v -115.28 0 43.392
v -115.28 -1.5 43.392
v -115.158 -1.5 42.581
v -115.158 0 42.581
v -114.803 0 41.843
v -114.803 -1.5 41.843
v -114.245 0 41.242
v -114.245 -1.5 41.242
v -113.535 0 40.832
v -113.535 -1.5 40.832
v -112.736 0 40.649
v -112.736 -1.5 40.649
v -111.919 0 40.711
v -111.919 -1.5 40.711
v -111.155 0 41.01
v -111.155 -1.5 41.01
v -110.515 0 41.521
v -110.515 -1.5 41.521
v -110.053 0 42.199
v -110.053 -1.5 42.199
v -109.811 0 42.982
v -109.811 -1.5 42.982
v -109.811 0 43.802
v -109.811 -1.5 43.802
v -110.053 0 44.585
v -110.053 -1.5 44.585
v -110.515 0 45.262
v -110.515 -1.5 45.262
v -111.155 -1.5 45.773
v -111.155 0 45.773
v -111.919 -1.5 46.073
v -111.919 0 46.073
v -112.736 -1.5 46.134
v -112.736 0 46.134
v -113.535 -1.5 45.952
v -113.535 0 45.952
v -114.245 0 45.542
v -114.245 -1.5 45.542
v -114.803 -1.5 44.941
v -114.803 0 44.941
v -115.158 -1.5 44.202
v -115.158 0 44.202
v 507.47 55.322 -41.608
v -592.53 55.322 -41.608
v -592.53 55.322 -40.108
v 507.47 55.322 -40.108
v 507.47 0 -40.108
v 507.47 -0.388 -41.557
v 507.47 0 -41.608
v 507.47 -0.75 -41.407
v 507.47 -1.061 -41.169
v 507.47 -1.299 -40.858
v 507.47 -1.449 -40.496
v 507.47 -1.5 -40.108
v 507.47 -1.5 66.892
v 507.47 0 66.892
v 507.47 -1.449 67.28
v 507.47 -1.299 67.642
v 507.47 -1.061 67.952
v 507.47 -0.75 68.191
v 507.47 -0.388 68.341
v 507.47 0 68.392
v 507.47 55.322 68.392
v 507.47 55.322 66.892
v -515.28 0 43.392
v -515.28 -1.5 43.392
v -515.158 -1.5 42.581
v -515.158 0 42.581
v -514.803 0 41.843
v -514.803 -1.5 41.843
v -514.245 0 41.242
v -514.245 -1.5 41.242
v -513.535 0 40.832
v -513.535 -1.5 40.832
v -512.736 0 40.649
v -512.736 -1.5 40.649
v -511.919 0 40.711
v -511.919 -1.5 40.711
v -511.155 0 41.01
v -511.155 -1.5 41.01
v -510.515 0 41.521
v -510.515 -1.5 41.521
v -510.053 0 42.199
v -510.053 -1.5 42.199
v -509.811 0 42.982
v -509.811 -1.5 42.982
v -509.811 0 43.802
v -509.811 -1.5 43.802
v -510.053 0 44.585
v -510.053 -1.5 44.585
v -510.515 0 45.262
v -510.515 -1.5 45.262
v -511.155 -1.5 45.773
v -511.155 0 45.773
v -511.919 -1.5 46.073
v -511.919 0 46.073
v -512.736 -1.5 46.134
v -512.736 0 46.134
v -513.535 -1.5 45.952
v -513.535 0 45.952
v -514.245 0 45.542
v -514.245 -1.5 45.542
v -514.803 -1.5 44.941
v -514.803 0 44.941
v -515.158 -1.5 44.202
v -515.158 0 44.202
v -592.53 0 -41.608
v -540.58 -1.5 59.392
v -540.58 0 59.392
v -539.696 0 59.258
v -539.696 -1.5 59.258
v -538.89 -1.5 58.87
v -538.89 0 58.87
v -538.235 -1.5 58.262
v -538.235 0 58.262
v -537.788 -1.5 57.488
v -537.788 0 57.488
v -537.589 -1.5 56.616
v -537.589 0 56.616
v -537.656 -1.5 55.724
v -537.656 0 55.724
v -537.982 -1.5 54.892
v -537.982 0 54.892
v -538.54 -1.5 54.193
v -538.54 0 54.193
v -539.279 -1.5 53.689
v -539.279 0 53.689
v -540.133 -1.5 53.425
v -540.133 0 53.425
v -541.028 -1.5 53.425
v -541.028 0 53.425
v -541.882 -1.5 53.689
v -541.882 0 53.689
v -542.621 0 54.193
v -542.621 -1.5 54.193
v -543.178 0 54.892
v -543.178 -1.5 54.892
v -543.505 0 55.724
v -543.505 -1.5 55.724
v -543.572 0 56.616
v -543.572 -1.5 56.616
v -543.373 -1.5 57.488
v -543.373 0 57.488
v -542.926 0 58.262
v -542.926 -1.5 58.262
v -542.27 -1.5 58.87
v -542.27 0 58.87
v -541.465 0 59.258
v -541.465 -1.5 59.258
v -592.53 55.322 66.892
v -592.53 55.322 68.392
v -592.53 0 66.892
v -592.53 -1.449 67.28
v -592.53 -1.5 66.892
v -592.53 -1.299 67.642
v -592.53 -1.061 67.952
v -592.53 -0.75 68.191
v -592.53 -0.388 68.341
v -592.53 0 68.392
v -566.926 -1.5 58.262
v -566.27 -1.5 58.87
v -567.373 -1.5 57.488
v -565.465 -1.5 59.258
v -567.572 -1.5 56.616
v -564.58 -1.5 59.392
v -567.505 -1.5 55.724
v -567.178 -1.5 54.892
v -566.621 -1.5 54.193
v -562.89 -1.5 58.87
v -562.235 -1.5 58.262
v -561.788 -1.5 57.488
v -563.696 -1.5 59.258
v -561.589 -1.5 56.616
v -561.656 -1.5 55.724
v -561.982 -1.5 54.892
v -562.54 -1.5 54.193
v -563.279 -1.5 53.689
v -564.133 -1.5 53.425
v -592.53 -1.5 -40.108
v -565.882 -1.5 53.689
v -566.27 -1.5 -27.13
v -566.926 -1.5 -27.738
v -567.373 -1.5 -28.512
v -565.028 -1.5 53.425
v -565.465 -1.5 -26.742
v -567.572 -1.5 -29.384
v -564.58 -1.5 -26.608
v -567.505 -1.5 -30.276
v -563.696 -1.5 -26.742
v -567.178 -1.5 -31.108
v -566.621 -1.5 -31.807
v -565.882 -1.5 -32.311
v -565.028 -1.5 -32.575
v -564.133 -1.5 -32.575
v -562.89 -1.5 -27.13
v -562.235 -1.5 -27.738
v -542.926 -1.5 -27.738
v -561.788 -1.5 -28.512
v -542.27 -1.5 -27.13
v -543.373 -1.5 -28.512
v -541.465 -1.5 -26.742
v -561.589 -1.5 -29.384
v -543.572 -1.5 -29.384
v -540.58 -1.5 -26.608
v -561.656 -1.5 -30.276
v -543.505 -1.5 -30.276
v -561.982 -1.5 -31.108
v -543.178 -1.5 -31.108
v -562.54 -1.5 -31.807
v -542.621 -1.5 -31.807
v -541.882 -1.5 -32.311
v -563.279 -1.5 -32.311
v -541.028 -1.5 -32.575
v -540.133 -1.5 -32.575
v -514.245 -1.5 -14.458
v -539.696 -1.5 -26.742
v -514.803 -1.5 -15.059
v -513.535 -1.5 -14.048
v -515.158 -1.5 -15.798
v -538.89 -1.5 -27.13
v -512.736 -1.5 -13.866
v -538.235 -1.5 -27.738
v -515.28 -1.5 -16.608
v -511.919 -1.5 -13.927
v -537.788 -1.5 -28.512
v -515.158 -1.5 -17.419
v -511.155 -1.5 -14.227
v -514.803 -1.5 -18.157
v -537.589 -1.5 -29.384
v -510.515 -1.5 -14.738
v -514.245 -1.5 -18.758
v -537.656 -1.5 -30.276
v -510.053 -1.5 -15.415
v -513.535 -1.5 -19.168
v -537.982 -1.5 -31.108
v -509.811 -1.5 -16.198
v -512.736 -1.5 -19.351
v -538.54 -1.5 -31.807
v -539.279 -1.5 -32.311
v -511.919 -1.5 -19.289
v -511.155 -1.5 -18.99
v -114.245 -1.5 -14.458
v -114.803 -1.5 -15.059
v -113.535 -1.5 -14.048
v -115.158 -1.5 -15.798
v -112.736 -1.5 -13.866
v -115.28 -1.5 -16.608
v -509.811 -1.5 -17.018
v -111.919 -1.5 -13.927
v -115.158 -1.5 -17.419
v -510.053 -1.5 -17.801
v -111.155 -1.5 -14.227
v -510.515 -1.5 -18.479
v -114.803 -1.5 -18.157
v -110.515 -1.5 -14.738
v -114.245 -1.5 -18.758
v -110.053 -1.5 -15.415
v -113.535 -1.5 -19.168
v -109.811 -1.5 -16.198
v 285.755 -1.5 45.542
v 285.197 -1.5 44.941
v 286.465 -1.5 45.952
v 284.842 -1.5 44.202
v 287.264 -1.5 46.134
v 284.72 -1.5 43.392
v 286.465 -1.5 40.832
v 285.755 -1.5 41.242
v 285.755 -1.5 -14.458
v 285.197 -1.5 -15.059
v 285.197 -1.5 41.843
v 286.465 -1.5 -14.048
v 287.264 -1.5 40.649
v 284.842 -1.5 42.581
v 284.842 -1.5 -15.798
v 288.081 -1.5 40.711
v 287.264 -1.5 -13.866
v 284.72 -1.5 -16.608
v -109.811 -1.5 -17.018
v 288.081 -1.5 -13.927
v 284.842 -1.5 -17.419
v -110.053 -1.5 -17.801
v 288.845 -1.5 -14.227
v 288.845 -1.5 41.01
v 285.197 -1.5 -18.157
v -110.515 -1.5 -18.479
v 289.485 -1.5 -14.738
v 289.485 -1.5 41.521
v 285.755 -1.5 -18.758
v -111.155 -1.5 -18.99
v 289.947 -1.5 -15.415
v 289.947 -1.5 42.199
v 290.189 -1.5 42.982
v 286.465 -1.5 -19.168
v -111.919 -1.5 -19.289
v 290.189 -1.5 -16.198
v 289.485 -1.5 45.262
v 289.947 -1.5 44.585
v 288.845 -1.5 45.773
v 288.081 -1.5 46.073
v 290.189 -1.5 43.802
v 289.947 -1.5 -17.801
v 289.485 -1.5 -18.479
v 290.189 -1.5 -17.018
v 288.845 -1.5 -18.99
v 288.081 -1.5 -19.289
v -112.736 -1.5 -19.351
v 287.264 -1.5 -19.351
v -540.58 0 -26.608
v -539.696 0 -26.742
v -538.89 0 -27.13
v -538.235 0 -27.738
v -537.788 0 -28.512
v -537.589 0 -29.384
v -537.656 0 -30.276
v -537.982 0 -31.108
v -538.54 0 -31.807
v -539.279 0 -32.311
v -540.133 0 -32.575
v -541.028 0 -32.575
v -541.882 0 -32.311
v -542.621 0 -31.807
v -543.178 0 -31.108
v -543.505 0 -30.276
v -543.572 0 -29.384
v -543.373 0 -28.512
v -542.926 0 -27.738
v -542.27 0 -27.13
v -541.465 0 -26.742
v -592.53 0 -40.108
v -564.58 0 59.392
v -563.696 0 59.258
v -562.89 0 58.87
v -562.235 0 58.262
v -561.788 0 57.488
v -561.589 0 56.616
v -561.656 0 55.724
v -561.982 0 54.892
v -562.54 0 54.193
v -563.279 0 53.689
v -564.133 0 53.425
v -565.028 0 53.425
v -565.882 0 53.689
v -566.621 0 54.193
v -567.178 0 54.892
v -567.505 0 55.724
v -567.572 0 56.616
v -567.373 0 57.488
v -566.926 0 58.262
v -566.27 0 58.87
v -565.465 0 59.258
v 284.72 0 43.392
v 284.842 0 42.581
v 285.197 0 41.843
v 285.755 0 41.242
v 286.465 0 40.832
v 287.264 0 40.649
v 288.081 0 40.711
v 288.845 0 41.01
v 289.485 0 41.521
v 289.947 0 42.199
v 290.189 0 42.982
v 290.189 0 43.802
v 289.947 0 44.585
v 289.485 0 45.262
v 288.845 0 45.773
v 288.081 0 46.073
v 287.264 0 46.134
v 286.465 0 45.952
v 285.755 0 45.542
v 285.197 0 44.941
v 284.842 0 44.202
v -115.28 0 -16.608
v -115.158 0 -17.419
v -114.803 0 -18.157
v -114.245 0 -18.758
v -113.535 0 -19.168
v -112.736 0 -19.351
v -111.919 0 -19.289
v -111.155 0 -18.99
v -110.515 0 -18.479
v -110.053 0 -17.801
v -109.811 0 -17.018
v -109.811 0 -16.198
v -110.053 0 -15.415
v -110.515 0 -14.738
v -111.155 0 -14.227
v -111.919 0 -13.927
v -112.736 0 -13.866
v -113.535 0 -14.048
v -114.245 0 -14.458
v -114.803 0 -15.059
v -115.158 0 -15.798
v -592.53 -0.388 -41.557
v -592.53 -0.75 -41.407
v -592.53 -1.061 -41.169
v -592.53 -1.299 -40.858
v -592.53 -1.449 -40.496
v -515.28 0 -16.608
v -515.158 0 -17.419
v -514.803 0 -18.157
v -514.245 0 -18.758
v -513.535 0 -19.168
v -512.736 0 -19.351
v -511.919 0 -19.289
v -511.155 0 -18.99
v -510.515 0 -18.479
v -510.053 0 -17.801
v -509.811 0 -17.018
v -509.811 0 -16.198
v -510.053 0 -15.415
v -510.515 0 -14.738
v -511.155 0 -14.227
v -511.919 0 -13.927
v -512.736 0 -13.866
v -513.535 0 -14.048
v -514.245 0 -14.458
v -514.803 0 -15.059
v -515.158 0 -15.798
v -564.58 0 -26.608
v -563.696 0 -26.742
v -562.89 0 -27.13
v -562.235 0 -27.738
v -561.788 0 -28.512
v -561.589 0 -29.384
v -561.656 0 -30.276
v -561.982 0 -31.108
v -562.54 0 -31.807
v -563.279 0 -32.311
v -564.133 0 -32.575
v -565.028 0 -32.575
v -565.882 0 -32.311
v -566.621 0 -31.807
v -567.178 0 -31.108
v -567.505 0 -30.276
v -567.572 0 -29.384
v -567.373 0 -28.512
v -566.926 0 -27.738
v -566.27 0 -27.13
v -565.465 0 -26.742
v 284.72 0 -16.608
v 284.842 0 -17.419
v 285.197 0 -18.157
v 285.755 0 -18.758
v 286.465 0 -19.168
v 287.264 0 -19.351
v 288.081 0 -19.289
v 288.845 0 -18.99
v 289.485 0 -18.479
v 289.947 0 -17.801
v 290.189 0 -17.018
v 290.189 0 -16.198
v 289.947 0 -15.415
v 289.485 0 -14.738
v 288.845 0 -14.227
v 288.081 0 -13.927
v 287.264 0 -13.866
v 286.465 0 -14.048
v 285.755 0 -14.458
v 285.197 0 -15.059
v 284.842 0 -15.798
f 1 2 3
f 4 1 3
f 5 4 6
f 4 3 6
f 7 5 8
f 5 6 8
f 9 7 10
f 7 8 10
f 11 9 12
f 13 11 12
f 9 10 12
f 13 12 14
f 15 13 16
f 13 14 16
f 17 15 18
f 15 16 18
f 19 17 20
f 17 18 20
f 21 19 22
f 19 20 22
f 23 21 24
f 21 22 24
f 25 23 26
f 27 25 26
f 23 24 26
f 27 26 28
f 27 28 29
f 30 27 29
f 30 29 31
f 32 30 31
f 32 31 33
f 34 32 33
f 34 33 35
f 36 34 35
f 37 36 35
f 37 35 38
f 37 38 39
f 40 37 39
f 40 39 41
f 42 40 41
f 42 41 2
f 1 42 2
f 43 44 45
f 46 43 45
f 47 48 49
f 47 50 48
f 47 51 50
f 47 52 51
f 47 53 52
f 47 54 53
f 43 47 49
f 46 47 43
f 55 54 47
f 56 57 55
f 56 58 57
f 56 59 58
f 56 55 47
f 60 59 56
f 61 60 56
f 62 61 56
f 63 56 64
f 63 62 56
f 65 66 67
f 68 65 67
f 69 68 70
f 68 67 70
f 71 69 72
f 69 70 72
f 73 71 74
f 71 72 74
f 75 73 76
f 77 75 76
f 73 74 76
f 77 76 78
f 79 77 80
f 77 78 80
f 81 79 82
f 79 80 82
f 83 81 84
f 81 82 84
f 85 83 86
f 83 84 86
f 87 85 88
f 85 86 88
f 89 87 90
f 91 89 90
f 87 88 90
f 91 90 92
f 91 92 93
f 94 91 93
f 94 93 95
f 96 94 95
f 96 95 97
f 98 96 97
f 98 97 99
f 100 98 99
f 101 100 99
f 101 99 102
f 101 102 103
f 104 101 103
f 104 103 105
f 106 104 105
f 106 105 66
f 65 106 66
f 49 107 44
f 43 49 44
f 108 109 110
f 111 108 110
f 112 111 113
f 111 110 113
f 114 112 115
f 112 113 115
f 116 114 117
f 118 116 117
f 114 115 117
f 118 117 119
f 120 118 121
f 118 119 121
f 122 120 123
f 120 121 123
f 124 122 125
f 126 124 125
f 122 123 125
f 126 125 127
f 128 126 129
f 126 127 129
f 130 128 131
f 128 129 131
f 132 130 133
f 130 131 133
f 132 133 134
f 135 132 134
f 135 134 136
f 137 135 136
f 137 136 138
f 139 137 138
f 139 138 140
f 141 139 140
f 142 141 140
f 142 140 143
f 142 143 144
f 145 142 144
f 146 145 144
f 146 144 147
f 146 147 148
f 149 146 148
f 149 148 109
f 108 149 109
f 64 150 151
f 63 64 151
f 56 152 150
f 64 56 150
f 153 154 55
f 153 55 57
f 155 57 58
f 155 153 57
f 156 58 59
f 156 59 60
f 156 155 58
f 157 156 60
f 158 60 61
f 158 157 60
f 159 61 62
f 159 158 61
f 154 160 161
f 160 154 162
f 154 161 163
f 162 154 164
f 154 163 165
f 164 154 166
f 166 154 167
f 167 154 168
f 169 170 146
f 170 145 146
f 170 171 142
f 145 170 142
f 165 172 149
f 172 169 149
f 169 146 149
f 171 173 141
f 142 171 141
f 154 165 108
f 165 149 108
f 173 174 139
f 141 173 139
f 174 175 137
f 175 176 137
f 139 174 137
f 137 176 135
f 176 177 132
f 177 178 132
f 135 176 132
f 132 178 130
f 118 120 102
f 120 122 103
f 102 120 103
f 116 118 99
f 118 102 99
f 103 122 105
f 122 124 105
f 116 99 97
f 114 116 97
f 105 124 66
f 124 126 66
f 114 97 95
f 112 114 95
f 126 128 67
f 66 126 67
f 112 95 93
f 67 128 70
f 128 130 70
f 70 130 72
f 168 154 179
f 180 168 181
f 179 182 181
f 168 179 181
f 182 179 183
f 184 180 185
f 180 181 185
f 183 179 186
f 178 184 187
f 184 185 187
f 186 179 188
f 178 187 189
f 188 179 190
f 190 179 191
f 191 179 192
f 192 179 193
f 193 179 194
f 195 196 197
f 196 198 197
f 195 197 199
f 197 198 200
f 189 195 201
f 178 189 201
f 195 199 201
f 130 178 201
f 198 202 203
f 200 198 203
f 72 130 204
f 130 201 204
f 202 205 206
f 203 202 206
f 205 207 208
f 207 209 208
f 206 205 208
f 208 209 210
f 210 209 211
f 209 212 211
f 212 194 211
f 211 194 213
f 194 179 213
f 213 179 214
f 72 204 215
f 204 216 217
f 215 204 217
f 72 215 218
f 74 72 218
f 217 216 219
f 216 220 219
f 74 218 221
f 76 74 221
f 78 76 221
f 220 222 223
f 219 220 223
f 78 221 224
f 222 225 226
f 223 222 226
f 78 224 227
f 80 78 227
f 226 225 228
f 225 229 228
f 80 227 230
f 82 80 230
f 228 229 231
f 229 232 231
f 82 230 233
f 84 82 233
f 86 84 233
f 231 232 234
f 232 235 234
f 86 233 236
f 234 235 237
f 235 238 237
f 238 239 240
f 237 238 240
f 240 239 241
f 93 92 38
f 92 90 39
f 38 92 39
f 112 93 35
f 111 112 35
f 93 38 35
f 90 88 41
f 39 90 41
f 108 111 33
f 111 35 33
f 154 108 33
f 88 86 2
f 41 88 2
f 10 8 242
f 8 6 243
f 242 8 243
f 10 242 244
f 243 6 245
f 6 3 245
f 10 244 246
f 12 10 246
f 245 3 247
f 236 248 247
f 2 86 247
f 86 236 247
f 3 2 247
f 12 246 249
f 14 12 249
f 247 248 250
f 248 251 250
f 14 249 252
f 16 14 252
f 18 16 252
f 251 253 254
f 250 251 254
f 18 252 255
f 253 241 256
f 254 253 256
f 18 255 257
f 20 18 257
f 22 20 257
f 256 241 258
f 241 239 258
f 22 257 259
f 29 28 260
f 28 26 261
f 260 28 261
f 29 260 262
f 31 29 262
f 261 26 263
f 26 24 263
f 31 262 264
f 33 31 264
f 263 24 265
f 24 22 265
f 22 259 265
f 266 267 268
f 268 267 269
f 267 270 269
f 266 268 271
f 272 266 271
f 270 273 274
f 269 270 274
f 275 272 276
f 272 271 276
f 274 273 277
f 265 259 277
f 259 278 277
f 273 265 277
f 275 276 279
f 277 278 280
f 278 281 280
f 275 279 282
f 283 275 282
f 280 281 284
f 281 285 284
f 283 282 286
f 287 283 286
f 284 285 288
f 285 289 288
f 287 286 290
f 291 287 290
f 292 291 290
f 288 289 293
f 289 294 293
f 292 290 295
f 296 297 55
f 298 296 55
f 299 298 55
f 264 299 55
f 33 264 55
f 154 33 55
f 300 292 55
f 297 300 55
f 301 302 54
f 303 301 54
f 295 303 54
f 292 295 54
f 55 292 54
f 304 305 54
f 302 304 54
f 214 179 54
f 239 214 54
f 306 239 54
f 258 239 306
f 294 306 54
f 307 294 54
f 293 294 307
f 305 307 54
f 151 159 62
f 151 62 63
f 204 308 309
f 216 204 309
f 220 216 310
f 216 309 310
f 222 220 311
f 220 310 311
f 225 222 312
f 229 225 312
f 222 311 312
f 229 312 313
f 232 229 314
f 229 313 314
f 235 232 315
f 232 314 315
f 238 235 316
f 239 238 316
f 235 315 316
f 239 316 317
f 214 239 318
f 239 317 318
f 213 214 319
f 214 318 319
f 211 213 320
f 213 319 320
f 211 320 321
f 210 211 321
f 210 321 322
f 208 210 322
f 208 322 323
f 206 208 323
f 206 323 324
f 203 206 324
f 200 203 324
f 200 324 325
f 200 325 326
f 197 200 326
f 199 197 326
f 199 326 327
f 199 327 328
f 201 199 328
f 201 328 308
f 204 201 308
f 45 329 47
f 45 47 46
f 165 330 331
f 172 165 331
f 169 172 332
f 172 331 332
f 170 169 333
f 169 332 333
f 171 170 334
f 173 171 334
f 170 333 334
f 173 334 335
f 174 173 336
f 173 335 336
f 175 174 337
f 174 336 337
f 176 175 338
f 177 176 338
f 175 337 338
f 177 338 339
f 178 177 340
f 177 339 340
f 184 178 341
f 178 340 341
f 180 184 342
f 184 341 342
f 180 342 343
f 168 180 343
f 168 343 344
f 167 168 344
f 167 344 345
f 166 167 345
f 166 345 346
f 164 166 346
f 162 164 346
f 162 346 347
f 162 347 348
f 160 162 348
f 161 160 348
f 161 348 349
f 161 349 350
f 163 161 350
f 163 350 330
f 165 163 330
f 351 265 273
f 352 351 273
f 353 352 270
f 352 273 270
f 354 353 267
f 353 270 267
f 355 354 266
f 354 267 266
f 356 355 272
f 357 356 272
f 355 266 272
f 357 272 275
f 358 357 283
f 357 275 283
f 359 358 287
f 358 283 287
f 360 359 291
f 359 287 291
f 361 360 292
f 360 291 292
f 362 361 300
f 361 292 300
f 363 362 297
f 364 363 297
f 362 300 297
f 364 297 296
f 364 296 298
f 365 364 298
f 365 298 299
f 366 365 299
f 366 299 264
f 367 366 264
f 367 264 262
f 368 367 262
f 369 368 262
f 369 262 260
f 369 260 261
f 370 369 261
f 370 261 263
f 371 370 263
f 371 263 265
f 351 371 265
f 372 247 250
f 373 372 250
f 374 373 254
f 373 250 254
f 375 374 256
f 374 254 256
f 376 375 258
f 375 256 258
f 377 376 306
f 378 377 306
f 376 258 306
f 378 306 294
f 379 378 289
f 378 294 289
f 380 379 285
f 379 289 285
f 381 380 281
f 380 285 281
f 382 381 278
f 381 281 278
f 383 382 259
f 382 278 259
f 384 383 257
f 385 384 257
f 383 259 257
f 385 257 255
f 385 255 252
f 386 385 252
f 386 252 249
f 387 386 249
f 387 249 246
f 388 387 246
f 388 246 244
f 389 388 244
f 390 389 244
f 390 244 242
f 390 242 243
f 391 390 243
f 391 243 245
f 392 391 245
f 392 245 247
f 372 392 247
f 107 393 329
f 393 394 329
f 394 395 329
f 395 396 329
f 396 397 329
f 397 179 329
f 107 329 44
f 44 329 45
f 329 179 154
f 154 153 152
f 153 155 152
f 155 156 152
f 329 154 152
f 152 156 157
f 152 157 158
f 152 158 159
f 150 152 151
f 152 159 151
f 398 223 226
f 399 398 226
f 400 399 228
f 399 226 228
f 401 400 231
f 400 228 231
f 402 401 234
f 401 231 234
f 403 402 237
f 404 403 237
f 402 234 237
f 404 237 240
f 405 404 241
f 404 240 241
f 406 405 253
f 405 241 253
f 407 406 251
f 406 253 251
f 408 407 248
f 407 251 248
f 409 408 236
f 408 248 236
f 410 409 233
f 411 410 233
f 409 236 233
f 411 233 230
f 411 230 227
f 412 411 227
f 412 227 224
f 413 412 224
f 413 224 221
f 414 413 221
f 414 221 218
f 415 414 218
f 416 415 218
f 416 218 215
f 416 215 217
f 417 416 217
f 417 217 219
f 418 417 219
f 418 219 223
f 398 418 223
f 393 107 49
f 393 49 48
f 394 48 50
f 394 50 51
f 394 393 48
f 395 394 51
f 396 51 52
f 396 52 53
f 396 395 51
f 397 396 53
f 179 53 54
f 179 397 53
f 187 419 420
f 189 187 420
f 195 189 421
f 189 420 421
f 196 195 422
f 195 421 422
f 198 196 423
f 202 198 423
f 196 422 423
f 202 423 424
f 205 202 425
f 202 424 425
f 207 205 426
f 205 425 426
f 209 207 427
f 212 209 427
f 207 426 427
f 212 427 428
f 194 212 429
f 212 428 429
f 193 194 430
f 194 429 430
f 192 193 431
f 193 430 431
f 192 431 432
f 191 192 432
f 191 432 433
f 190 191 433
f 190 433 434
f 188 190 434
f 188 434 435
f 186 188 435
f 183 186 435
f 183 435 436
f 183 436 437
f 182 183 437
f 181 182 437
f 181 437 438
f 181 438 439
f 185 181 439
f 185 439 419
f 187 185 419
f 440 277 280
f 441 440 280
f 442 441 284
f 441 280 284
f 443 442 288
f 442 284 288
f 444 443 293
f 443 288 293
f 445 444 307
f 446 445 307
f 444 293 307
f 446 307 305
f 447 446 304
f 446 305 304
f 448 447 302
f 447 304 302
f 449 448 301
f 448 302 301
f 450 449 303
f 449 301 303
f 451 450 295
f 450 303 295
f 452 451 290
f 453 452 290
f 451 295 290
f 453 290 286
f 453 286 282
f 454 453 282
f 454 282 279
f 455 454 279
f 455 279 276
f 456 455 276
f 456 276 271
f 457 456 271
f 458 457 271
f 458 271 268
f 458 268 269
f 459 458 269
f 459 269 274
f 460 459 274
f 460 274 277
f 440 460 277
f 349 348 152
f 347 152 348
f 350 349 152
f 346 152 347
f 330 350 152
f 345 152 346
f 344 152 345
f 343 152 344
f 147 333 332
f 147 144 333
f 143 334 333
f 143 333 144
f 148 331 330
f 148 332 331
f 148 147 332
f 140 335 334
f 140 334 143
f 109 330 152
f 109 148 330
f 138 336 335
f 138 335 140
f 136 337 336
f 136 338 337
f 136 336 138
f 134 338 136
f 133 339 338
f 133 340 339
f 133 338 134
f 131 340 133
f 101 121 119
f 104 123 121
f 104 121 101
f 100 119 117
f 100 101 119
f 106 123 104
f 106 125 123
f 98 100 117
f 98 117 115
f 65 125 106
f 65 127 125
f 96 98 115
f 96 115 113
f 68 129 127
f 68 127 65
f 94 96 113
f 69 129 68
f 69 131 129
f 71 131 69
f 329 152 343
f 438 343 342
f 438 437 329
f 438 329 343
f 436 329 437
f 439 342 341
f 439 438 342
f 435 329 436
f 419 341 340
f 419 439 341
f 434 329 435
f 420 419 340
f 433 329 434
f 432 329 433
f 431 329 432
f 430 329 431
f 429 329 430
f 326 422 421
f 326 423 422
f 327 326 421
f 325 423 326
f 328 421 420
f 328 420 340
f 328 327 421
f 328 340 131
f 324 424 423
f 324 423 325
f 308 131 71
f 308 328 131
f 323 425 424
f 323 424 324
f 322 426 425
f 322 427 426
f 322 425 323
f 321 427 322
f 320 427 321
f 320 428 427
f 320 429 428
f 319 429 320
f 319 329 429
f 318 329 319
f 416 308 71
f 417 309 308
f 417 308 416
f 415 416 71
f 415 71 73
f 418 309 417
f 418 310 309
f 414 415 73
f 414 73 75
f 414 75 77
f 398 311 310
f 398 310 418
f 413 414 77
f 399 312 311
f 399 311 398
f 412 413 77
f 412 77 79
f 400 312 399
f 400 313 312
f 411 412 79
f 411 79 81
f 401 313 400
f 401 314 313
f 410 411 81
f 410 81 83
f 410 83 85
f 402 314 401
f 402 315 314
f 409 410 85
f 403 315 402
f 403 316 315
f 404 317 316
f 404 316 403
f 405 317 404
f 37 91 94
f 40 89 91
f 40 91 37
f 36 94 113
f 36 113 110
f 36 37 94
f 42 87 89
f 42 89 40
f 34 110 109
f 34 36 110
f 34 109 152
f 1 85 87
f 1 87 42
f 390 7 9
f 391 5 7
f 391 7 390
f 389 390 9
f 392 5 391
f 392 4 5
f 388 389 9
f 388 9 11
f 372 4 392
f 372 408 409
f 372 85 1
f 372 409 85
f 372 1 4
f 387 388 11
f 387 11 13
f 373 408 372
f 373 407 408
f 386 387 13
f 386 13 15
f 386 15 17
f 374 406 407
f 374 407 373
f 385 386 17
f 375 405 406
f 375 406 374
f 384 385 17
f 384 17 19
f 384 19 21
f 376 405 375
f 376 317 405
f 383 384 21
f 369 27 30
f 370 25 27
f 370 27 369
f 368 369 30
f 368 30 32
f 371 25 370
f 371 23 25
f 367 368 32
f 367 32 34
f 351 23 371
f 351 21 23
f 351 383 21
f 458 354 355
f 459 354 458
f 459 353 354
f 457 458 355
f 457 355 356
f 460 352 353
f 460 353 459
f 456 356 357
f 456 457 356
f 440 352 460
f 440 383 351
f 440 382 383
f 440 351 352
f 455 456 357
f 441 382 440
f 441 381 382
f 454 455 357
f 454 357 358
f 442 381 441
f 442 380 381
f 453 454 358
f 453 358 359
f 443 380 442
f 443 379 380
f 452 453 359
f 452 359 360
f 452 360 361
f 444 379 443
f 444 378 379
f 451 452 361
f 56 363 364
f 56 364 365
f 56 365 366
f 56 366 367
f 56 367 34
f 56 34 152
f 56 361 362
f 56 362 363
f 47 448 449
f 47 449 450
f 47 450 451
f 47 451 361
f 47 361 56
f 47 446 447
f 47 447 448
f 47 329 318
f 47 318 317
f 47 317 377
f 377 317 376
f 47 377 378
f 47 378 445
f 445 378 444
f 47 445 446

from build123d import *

# Parameters (mm, degrees)
CROQUIS1_W                      = 1100
CROQUIS1_H                      = 220
BRIDA_BASE1_DEPTH               = 1.5
PLIEGUE_START                   = -592.530487805
PLIEGUE_CROQUIZADO1_DEPTH       = 1100
PLIEGUE_CROQUIZADO1_2_OUTLINE_W = 55.321902755
PLIEGUE_CROQUIZADO1_2_OUTLINE_H = 1.5
PLIEGUE_CROQUIZADO1_2_DEPTH     = 1100
CROQUIS8_R                      = 3
CORTAR_EXTRUIR1_DEPTH           = 10
TALADRO_DE_MARGEN_PARA_M51_D    = 5.5


# Read off the part's stored shape, not the designer's step: Pliegue croquizado1
# Sheet-metal steps are written as plain solids
with BuildPart() as part:
    # Croquis1 → Brida base1 (new body)
    with BuildSketch(Plane(origin=(0, 0, 0), x_dir=(1, 0, 0), z_dir=(0, 1, 0))):
        with Locations((-42.530487805, -13.391768293)):
            Rectangle(CROQUIS1_W, CROQUIS1_H)
    extrude(amount=-BRIDA_BASE1_DEPTH)

    # Pliegue croquizado1 outline → Pliegue croquizado1 (cut)
    with BuildSketch(Plane.YZ.offset(PLIEGUE_START)):
        with BuildLine():
            Line((0, -96.608231707), (0, -41.608231707))
            ThreePointArc((0, -41.608231707), (-1.060660172, -41.168891879), (-1.5, -40.108231707))
            Line((-1.5, -40.108231707), (-1.5, -96.608231707))
            Line((-1.5, -96.608231707), (0, -96.608231707))
        make_face()
        with BuildLine():
            Line((-1.5, 123.391768293), (-1.5, 66.891768293))
            ThreePointArc((-1.5, 66.891768293), (-1.060660171, 67.952428465), (0, 68.391768293))
            Line((0, 68.391768293), (0, 123.391768293))
            Line((0, 123.391768293), (-1.5, 123.391768293))
        make_face()
    extrude(amount=PLIEGUE_CROQUIZADO1_DEPTH, mode=Mode.SUBTRACT)

    # Pliegue croquizado1 2 outline → Pliegue croquizado1 2 (add)
    with BuildSketch(Plane.YZ.offset(PLIEGUE_START)):
        with Locations((27.660951378, -40.858231707)):
            Rectangle(PLIEGUE_CROQUIZADO1_2_OUTLINE_W, PLIEGUE_CROQUIZADO1_2_OUTLINE_H)
        with Locations((27.660951378, 67.641768293)):
            Rectangle(PLIEGUE_CROQUIZADO1_2_OUTLINE_W, PLIEGUE_CROQUIZADO1_2_OUTLINE_H)
    extrude(amount=PLIEGUE_CROQUIZADO1_2_DEPTH)

    # Croquis8 → Cortar-Extruir1 (cut)
    with BuildSketch(Plane(origin=(0, 0, 0), x_dir=(1, 0, 0), z_dir=(0, 1, 0))):
        with Locations(Location((-564.580402517, -56.391768293, 0), (0, 0, 270))):
            Circle(CROQUIS8_R)
        with Locations(Location((-540.580402517, -56.391768293, 0), (0, 0, 270))):
            Circle(CROQUIS8_R)
        with Locations(Location((-540.580402517, 29.608231707, 0), (0, 0, 270))):
            Circle(CROQUIS8_R)
        with Locations(Location((-564.580402517, 29.608231707, 0), (0, 0, 270))):
            Circle(CROQUIS8_R)
    extrude(amount=-CORTAR_EXTRUIR1_DEPTH, mode=Mode.SUBTRACT)

    # Taladro de margen para M51 (through all)
    with Locations(Plane(origin=(0, 0, 0), x_dir=(1, 0, 0), z_dir=(0, 1, 0))):
        with Locations((-512.530487805, -43.391768293), (-512.530487805, 16.608231707), (-112.530487805, -43.391768293), (-112.530487805, 16.608231707), (287.469512195, -43.391768293), (287.469512195, 16.608231707)):
            Hole(TALADRO_DE_MARGEN_PARA_M51_D / 2)


solid = part.part
